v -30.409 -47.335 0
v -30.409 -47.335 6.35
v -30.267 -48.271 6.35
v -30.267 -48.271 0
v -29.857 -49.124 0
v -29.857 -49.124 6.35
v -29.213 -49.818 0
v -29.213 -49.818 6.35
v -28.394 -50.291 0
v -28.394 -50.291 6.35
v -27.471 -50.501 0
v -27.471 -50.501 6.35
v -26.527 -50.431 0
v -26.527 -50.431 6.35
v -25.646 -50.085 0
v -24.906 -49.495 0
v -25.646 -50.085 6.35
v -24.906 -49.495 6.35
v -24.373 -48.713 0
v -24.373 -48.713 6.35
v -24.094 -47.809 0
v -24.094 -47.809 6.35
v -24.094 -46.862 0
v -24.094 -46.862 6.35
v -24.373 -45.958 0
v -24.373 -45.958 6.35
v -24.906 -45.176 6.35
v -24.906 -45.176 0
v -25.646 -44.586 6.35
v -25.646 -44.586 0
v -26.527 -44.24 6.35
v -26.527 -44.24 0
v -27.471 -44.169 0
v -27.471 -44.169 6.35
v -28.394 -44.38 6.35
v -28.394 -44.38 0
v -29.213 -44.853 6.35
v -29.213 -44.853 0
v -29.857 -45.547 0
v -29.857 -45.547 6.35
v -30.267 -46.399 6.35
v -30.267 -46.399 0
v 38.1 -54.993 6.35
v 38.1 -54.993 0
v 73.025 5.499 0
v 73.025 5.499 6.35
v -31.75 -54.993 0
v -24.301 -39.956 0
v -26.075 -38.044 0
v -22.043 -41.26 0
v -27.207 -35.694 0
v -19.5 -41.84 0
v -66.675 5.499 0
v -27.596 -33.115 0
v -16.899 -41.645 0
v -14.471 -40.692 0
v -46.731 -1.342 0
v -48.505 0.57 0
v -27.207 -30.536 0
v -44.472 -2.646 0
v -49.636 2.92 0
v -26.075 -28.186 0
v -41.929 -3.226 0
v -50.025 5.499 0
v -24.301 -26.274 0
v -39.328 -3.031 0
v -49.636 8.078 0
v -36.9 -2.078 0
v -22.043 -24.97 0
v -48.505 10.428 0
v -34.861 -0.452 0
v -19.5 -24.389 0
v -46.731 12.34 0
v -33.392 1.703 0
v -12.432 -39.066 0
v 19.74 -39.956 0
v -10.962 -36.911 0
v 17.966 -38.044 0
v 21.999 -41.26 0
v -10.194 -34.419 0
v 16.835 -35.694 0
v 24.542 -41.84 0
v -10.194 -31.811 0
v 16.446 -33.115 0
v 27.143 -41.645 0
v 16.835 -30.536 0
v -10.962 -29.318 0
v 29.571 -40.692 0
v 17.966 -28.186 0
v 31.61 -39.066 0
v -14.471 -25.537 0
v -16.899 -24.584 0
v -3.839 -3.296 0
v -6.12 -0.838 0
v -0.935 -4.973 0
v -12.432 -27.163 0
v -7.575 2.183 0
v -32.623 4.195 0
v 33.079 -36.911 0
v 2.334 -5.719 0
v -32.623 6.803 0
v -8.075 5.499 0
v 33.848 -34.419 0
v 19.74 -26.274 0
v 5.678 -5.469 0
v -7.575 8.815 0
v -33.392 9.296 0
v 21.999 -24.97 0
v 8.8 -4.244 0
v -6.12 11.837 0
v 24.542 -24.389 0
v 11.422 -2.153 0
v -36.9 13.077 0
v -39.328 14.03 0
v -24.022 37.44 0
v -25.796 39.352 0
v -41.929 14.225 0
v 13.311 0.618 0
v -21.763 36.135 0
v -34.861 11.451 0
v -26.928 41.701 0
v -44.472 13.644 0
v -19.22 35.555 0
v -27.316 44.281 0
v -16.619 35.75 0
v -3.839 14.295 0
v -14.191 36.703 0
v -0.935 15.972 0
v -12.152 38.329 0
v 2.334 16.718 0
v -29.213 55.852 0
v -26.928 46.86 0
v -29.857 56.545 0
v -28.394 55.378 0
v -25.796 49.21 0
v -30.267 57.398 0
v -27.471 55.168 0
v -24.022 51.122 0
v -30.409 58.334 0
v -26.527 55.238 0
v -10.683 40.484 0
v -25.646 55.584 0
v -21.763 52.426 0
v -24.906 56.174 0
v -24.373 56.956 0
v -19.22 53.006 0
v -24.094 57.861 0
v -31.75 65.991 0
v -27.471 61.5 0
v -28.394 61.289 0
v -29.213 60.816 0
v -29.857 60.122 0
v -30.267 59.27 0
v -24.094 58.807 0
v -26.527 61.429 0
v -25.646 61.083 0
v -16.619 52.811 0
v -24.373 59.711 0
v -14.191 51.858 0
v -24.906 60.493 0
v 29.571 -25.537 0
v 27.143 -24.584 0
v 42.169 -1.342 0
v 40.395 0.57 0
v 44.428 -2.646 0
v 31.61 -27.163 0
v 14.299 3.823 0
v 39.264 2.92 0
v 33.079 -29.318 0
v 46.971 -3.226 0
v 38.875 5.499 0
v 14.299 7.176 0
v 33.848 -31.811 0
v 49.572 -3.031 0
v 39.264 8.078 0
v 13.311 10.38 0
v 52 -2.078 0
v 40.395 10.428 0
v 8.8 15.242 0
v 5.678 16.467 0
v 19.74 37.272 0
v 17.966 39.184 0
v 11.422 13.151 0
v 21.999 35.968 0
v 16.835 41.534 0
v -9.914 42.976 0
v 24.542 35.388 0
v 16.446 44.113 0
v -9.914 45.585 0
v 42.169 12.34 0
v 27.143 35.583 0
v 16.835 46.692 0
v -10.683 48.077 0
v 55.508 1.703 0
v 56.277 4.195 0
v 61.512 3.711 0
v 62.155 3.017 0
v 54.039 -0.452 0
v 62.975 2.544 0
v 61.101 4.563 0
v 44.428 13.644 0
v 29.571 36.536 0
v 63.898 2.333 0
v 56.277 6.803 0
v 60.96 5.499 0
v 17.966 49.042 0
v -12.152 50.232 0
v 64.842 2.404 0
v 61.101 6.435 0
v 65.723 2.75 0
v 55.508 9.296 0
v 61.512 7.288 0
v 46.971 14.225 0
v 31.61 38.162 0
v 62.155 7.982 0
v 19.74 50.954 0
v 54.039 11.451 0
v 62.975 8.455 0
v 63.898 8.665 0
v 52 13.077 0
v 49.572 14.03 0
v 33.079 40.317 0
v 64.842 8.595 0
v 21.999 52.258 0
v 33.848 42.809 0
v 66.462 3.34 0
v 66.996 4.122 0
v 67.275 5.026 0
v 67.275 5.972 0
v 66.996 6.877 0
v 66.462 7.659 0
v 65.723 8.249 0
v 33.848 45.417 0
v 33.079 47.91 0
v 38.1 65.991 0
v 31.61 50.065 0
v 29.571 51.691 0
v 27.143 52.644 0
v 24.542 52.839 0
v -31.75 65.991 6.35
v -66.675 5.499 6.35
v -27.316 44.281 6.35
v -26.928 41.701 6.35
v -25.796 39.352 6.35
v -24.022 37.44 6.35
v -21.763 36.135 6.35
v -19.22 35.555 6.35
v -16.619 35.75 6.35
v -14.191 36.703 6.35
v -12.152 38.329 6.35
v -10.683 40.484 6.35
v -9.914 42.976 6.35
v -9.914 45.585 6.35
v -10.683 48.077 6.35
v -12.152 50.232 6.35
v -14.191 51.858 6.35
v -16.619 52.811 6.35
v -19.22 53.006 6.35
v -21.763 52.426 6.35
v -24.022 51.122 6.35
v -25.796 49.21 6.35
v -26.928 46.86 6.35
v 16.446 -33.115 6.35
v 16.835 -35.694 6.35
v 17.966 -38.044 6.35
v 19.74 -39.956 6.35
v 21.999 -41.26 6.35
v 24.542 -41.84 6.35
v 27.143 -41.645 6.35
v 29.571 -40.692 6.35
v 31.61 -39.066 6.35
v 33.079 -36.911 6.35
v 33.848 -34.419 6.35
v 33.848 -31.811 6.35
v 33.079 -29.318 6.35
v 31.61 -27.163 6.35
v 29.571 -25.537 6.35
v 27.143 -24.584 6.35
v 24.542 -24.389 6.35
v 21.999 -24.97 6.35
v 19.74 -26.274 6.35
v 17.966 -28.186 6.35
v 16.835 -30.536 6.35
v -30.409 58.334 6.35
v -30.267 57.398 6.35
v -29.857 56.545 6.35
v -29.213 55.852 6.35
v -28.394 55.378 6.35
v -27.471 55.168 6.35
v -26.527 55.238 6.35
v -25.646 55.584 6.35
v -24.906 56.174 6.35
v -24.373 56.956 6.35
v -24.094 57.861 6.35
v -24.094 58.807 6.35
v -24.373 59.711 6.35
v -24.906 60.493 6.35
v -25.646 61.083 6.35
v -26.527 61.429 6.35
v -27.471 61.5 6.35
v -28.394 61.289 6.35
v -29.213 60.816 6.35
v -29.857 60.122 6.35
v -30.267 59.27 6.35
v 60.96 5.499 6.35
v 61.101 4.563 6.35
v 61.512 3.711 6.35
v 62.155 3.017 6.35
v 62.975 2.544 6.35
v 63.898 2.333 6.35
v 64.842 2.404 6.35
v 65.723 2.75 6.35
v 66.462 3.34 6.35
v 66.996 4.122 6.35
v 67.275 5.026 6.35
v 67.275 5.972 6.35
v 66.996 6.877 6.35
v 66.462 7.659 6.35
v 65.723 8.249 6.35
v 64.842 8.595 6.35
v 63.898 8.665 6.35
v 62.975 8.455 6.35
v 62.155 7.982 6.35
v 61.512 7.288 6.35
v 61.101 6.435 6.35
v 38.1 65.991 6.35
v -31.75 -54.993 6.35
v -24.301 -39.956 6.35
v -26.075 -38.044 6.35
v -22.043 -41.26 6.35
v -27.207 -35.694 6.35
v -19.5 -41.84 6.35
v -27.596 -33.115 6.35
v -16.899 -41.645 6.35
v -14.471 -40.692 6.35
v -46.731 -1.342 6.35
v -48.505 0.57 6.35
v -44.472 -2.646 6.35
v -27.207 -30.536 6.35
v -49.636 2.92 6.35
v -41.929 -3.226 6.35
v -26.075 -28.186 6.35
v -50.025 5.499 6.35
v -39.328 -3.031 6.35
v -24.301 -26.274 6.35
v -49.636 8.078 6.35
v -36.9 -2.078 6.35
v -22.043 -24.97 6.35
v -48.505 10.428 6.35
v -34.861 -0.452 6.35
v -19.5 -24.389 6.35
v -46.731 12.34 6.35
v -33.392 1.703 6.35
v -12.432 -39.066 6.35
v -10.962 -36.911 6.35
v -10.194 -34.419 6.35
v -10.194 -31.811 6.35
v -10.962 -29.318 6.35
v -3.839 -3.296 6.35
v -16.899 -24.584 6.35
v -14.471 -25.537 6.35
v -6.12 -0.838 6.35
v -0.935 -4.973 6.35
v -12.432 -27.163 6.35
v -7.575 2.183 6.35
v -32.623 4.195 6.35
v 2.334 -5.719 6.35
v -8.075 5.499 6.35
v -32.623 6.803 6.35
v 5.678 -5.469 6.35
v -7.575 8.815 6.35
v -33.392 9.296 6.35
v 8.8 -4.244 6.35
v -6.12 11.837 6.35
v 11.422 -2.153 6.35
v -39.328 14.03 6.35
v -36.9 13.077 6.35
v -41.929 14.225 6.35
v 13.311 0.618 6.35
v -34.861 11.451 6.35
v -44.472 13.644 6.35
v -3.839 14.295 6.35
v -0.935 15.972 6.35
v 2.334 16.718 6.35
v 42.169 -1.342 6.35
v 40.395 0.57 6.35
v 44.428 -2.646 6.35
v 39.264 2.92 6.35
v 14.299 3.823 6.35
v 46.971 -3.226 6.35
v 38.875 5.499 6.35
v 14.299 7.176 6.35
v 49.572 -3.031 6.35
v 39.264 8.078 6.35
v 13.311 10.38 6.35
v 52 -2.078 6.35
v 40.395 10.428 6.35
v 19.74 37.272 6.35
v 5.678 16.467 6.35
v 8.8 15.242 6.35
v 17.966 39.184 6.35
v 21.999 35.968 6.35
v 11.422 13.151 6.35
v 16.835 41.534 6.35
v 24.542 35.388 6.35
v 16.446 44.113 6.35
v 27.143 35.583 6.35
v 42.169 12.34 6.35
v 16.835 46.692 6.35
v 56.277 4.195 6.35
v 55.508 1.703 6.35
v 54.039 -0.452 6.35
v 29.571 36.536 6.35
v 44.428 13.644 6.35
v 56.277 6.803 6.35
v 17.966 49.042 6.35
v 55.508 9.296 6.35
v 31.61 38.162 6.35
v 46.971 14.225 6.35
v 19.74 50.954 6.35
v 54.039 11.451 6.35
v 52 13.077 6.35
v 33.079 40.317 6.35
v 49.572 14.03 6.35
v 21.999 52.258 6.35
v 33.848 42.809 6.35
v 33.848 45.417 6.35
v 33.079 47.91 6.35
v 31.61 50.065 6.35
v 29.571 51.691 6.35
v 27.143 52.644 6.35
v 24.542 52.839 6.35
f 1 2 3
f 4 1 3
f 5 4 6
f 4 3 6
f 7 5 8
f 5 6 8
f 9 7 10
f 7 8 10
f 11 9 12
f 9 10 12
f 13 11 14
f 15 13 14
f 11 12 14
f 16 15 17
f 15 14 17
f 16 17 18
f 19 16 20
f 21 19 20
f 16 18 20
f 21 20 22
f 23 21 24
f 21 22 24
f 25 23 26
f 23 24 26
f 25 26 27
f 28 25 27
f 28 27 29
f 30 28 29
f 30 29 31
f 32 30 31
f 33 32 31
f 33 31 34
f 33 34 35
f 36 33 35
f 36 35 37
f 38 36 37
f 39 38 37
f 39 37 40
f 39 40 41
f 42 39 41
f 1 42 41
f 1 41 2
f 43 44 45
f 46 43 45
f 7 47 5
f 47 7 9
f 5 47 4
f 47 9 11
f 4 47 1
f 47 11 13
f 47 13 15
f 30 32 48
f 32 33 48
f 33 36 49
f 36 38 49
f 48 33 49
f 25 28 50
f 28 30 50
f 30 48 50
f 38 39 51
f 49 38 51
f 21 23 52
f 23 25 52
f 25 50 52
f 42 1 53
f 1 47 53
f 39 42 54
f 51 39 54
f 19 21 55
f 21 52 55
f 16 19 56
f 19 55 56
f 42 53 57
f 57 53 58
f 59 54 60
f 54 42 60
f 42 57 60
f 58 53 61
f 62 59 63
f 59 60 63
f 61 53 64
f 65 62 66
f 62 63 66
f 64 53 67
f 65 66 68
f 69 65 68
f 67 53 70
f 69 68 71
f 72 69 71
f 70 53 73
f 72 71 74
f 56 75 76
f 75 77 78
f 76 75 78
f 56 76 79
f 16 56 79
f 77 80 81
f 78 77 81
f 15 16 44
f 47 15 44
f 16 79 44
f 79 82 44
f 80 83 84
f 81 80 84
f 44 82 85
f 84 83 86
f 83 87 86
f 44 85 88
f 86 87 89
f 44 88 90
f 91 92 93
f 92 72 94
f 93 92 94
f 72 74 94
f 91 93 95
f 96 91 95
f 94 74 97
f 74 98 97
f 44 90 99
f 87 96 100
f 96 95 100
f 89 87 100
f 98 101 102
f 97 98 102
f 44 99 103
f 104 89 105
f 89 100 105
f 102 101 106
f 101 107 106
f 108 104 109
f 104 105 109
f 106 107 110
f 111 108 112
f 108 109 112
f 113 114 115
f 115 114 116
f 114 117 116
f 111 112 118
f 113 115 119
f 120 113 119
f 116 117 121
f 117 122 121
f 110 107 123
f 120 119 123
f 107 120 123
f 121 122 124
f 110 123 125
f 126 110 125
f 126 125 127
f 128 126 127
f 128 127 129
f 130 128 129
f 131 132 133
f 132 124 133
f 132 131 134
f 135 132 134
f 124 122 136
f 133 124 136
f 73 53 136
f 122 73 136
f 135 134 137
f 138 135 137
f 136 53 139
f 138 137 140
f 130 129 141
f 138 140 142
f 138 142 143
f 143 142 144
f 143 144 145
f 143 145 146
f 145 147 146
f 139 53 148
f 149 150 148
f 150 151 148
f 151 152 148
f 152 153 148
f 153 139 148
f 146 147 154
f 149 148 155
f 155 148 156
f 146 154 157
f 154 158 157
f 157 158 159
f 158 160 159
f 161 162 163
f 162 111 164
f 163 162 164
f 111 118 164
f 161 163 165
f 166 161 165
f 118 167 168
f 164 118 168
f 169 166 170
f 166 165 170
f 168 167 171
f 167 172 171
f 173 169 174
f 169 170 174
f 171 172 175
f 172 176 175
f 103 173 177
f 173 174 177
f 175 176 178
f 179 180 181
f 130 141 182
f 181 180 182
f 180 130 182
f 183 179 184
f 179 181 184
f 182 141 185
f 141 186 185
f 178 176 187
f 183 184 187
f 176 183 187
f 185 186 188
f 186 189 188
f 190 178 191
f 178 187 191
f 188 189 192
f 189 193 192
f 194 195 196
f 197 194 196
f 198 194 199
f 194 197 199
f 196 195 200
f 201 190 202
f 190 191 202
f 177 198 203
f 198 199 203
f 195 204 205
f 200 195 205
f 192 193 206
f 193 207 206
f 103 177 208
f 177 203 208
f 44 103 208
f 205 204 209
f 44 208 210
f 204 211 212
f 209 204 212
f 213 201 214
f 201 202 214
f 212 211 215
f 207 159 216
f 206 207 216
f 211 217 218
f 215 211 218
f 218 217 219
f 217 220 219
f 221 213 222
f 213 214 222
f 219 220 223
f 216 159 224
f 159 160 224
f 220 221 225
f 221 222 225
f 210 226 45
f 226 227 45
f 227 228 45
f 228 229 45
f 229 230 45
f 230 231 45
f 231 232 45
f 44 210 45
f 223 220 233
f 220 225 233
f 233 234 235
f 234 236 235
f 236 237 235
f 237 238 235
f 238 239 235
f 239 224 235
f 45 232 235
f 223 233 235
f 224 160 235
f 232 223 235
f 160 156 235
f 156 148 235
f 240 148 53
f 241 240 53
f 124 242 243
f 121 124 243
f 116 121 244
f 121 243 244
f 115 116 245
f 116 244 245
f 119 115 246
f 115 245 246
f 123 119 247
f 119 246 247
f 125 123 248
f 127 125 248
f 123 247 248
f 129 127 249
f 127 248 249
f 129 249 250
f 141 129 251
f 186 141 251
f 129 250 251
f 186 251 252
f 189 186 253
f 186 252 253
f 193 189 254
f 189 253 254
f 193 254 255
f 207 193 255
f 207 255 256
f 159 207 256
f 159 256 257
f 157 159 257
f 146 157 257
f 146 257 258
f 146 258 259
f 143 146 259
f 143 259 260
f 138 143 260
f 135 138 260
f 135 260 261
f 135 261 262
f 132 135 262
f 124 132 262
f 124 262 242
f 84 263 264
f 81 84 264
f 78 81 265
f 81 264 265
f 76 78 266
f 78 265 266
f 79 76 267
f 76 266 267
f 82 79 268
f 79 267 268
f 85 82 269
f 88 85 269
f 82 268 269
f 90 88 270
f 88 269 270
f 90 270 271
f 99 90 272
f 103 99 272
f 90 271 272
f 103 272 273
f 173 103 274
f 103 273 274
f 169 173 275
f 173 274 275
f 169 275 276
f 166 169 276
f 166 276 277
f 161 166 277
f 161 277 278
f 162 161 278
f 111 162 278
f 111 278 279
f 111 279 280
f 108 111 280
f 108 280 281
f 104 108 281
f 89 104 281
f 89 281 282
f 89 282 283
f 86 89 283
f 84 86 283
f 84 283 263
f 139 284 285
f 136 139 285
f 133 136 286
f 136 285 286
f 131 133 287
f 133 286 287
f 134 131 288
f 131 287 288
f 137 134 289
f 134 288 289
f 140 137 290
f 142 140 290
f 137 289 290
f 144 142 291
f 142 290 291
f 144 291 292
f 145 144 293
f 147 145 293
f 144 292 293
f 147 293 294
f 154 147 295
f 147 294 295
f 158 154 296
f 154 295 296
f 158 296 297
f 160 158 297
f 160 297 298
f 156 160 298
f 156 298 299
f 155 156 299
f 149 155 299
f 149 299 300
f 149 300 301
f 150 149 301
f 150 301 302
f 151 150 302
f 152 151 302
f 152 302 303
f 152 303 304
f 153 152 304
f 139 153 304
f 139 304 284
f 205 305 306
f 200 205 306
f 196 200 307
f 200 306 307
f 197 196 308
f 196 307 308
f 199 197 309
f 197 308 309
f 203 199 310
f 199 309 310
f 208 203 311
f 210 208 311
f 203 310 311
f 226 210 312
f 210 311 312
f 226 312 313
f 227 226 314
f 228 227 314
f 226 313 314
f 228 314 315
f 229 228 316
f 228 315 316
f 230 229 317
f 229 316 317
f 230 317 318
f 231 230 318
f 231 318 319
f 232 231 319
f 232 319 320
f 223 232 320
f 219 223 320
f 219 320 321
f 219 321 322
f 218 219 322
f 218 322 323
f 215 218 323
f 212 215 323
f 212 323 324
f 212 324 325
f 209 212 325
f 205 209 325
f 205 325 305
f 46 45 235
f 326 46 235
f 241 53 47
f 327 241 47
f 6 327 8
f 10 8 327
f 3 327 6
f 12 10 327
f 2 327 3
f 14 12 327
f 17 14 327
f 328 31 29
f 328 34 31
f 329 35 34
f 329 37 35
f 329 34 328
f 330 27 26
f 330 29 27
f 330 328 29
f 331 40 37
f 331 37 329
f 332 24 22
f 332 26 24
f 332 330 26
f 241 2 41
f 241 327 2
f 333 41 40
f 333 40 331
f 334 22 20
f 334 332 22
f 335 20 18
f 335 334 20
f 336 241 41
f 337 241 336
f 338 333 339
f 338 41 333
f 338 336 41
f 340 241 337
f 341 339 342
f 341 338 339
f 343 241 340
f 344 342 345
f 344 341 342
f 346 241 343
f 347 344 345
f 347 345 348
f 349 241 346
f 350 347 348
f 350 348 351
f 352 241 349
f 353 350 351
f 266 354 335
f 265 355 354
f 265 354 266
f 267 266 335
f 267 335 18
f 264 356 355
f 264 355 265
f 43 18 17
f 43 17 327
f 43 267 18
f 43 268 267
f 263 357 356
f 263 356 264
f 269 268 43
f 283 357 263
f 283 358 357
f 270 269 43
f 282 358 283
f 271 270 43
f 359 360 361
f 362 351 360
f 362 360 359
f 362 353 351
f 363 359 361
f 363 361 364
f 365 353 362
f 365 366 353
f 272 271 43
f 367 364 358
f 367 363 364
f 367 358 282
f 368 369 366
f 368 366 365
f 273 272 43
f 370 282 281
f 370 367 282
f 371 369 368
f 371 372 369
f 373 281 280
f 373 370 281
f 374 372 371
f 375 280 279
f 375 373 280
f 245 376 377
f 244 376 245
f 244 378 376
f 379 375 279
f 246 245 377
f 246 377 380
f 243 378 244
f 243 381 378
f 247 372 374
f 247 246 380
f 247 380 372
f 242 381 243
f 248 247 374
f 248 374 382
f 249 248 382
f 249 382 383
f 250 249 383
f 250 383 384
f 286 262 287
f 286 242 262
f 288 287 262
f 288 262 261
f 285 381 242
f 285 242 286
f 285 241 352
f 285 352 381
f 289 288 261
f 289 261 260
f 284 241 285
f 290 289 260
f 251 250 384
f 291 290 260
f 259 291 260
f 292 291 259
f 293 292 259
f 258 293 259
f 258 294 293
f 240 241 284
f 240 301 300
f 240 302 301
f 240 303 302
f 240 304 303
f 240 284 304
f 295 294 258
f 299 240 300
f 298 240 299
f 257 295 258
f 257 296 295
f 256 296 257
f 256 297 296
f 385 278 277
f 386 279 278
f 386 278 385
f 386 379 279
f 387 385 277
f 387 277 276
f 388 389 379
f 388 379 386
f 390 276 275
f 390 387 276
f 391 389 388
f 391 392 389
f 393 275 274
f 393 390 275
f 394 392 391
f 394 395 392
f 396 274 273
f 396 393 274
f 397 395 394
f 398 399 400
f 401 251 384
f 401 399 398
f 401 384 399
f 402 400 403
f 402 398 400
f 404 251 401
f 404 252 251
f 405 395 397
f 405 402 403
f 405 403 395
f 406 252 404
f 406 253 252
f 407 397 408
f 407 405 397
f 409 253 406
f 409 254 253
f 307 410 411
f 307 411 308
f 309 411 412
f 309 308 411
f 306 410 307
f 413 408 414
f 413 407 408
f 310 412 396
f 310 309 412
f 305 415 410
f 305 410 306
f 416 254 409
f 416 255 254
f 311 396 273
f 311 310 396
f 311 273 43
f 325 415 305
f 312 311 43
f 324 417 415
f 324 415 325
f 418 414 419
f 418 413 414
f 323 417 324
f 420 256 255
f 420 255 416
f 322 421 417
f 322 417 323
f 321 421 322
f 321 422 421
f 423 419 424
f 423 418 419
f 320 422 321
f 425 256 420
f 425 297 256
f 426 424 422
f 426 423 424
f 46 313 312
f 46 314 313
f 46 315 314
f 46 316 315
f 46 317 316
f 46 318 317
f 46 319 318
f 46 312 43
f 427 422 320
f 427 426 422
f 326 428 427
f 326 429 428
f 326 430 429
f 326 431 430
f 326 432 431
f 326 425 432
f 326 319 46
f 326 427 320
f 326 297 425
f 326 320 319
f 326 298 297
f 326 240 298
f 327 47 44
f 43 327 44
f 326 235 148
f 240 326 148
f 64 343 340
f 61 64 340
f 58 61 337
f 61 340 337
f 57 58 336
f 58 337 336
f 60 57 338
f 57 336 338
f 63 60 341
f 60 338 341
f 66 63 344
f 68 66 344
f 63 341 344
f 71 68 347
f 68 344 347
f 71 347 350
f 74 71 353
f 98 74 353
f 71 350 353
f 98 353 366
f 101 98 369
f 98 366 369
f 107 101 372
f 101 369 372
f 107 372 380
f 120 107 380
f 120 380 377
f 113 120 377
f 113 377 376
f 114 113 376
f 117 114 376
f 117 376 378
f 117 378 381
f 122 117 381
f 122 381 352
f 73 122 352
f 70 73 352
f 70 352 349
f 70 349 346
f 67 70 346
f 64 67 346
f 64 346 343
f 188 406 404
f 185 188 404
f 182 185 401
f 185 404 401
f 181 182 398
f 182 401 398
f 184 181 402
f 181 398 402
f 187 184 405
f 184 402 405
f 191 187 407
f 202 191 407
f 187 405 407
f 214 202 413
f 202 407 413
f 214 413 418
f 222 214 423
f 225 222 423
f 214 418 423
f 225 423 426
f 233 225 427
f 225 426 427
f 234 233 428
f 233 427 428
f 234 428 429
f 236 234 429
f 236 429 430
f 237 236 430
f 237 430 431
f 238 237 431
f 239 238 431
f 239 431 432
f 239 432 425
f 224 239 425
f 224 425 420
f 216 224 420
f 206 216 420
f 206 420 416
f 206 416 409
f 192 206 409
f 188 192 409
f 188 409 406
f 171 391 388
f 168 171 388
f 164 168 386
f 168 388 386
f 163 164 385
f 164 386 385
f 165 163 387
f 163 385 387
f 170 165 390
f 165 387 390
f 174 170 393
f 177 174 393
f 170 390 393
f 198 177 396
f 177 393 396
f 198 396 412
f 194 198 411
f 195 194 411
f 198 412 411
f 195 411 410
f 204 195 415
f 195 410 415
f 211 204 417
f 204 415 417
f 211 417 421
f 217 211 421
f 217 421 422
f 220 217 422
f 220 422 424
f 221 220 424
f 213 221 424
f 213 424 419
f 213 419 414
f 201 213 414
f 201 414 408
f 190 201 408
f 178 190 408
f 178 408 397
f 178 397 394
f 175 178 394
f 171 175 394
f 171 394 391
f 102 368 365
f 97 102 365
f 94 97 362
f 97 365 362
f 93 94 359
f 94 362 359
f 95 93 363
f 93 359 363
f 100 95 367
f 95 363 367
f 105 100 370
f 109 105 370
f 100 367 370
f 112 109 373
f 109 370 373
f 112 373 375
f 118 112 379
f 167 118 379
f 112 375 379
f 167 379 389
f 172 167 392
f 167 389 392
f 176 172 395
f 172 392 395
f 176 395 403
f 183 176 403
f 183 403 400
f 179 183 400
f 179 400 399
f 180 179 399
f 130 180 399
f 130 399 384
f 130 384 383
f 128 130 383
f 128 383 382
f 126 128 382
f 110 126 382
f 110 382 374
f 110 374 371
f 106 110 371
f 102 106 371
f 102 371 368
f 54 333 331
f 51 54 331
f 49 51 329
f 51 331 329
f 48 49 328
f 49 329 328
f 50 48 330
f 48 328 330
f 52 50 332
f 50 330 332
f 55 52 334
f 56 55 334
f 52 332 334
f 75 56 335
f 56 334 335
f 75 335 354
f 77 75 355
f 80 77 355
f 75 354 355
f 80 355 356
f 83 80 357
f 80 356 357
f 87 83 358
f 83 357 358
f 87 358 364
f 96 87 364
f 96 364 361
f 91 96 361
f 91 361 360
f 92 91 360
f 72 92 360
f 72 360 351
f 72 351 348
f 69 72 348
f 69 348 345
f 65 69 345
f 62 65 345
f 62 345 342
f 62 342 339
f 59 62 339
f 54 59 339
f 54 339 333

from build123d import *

# Parameters (mm, degrees)
F1_DEPTH = 6.35
F2_D     = 17.5
F3_D     = 6.35
F4_D     = 22.5


with BuildPart() as f1:
    # F0 (on Top) → F1 (new body)
    with BuildSketch(Plane.XY):
        Polygon((38.1, 65.9911357684), (-31.75, 65.9911357684), (-66.675, 5.499261314), (-31.75, -54.9926131403), (38.1, -54.9926131403), (73.025, 5.499261314), align=None)
    extrude(amount=F1_DEPTH)

    # F2 (through all)
    with Locations(Plane(origin=(0, 0, 0), x_dir=(1, 0, 0), z_dir=(0, 0, -1))):
        with Locations((25.195854684, -44.1132237642), (47.625, -5.499261314), (25.195854684, 33.1147011361), (-18.845854684, 33.1147011361), (-41.275, -5.499261314), (-18.5662683496, -44.2805572462)):
            Hole(F2_D / 2)

    # F3 (through all)
    with Locations(Plane(origin=(0, 0, 0), x_dir=(1, 0, 0), z_dir=(0, 0, -1))):
        with Locations((64.135, -5.499261314), (-27.2335491394, 47.3353439388), (-27.2335491394, -58.3338665669)):
            Hole(F3_D / 2)

    # F4 (through all)
    with Locations(Plane(origin=(0, 0, 0), x_dir=(1, 0, 0), z_dir=(0, 0, -1))):
        with Locations((3.175, -5.499261314)):
            Hole(F4_D / 2)


solid = f1.part
